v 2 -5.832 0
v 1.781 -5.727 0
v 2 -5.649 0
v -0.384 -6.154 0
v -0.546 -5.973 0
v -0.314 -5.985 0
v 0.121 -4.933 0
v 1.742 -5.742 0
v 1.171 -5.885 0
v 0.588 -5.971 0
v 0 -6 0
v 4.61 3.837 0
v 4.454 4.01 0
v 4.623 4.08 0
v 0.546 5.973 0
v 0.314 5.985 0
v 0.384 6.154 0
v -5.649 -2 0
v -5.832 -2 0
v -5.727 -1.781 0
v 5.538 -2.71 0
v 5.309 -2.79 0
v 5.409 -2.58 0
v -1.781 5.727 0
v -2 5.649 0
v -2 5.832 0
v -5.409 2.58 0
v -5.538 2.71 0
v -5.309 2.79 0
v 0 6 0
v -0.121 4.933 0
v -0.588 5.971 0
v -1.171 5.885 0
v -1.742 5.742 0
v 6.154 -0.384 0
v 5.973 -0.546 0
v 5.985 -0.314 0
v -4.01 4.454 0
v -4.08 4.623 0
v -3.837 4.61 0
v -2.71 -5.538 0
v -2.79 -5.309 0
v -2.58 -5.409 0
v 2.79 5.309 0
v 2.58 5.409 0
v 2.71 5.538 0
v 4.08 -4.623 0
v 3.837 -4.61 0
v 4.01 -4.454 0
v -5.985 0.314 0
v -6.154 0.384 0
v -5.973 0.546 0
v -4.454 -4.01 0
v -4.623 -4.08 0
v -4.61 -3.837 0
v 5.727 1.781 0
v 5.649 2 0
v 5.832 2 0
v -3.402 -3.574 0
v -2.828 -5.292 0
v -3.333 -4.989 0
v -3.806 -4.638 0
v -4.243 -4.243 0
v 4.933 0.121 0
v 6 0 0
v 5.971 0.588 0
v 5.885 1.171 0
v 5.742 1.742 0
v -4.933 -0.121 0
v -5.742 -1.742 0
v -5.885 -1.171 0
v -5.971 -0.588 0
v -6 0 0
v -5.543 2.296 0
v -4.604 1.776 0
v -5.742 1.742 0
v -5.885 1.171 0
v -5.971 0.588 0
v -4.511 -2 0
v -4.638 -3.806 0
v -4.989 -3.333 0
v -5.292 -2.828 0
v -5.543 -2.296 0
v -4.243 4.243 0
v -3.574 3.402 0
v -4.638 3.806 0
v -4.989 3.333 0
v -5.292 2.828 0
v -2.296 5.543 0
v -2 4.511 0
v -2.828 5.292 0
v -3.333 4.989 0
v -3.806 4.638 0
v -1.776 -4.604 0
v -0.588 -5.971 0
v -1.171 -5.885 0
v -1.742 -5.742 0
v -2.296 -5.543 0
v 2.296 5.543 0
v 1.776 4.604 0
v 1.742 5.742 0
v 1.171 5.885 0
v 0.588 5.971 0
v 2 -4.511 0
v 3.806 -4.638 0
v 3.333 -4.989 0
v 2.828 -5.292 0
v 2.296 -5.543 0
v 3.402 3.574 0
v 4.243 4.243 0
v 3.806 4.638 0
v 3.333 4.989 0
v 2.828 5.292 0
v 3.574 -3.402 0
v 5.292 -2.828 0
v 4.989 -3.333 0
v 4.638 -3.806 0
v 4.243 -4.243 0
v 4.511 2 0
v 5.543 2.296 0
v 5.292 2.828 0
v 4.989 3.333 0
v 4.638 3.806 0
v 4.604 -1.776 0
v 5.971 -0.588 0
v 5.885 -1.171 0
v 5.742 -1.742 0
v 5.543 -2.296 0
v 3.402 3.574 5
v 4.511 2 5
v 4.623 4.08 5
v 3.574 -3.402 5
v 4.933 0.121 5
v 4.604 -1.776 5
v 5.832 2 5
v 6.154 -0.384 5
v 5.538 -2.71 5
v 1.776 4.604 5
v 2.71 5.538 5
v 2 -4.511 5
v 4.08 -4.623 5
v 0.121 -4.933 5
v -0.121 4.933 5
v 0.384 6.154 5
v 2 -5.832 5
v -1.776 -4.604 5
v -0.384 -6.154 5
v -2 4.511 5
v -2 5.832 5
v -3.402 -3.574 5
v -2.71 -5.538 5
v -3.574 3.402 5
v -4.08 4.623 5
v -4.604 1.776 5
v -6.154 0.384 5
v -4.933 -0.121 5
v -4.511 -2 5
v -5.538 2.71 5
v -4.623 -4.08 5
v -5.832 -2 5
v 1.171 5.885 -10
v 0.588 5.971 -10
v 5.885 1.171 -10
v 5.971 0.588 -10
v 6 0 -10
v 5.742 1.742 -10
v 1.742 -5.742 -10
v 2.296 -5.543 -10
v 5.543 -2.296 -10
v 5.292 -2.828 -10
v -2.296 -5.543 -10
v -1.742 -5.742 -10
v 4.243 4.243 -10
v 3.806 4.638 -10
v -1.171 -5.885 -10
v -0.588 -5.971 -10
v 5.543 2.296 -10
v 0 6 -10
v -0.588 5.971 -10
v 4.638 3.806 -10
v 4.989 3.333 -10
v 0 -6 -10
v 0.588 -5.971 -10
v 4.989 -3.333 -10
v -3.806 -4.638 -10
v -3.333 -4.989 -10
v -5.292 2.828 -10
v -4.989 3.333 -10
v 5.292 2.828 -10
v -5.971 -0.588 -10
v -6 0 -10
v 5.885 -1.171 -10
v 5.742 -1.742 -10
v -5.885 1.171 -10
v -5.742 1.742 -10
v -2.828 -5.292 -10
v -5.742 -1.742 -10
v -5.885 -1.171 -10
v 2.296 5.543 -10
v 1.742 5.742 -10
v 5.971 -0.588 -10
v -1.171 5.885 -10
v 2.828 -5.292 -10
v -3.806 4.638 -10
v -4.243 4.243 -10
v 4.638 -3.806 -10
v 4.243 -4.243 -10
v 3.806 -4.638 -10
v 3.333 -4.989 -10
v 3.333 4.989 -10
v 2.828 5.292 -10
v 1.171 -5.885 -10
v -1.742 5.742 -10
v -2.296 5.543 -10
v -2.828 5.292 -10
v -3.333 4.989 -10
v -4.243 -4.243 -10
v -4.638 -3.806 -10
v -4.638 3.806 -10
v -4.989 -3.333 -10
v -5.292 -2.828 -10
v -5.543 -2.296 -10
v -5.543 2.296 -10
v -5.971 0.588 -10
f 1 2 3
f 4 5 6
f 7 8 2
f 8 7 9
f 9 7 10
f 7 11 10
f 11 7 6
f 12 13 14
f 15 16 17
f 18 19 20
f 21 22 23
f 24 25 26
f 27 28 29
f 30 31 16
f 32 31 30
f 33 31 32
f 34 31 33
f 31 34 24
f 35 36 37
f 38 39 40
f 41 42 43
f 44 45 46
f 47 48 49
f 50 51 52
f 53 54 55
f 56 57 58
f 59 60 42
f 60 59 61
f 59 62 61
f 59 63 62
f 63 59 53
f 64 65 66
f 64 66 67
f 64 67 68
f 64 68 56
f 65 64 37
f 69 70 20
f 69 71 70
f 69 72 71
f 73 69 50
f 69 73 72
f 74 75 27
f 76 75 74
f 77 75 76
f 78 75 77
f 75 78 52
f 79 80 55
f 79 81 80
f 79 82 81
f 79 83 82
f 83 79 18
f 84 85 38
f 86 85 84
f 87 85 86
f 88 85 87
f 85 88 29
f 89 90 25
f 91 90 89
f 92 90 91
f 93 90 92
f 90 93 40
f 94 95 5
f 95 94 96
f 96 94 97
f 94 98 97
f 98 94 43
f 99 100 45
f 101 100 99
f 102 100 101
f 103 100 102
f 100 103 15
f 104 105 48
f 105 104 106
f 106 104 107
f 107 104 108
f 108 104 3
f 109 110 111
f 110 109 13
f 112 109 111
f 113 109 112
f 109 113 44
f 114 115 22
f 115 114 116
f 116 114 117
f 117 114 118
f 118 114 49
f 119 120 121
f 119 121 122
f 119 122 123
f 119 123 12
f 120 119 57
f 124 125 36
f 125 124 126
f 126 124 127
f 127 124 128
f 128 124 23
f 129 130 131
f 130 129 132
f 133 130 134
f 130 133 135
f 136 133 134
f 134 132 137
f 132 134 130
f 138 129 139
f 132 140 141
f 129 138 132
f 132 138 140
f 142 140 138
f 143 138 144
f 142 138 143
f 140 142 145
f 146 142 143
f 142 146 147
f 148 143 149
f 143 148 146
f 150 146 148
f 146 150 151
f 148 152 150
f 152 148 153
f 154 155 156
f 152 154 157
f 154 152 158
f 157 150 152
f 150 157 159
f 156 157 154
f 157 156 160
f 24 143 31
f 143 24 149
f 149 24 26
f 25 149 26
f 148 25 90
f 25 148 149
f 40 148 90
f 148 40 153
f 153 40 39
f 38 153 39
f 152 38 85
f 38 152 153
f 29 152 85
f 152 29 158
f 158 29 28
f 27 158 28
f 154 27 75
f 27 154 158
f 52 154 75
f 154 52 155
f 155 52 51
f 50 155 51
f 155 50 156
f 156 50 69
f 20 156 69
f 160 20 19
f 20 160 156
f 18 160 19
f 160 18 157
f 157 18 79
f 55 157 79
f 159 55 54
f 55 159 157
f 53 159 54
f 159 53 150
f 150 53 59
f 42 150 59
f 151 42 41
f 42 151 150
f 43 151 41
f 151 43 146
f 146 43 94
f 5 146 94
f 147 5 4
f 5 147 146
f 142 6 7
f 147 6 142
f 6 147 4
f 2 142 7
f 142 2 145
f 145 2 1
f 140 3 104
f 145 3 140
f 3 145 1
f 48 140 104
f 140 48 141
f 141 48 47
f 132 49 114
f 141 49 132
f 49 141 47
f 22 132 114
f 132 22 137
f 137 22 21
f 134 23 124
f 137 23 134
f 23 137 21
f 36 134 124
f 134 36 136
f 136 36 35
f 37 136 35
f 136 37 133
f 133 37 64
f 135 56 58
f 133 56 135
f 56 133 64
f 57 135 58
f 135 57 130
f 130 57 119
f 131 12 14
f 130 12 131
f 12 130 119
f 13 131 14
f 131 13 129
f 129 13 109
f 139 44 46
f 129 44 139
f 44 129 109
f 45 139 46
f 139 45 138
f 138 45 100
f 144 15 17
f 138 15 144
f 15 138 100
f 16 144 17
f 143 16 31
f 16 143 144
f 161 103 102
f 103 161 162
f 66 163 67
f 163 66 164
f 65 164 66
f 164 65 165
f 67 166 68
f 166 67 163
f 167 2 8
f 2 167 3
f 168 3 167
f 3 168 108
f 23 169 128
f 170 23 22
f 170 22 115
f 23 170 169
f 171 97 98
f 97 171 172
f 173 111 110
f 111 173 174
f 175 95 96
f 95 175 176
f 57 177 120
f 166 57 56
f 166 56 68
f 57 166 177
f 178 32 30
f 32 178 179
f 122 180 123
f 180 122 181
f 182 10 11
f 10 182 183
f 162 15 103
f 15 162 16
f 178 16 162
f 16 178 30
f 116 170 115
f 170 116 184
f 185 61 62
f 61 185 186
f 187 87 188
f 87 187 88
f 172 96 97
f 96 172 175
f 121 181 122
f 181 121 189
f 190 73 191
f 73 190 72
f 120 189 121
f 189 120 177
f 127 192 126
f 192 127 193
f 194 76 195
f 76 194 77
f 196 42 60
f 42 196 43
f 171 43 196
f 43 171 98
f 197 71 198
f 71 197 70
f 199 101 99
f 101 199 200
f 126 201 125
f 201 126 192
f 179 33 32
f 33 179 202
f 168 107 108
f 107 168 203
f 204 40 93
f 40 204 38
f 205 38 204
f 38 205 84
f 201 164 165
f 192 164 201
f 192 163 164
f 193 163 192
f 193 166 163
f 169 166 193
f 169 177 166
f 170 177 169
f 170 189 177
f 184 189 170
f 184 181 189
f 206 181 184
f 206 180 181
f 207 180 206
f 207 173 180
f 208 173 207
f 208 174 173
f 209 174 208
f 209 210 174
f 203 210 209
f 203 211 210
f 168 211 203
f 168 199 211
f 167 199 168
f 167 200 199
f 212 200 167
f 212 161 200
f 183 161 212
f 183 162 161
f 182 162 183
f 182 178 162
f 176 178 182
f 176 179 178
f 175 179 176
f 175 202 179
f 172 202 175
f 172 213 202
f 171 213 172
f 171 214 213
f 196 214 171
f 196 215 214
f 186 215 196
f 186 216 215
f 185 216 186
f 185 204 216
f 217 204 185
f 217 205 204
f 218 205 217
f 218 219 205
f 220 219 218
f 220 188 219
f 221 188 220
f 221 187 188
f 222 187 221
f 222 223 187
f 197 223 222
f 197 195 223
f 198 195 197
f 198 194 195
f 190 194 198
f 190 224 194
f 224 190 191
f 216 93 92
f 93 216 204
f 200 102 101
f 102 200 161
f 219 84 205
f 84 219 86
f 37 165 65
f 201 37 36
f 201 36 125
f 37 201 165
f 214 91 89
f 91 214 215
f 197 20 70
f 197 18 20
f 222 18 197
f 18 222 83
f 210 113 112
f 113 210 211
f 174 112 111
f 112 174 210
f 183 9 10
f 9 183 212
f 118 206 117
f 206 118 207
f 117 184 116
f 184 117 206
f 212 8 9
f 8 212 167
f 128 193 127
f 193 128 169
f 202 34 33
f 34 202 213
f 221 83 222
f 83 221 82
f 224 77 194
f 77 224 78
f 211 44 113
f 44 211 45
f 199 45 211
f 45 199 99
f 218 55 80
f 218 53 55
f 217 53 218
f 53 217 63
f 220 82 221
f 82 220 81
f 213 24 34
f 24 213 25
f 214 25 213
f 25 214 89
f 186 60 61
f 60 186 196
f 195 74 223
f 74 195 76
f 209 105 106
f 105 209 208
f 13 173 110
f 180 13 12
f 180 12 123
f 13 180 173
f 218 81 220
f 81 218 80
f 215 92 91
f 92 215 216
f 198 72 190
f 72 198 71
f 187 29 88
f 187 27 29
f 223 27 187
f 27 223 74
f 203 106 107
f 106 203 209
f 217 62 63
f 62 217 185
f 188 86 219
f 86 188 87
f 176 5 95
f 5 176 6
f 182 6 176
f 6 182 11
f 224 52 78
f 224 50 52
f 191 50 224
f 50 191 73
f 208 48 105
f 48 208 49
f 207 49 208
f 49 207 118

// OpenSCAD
module timing_pulley(teeth=16, pitch_diameter=9.75, belt_width=5, hub_diameter=12, hub_height=10) {
    tooth_height = 2;
    tooth_width = pitch_diameter * PI / teeth;
    pulley_height = belt_width + hub_height;
    
    module tooth() {
        translate([0, pitch_diameter / 2, 0])
        rotate([0, 0, 90])
        linear_extrude(height=belt_width)
        polygon(points=[[0, 0], [tooth_width / 2, tooth_height], [-tooth_width / 2, tooth_height]]);
    }
    
    union() {
        // Create the main pulley body
        cylinder(d=pitch_diameter, h=belt_width, $fn=64);
        
        // Add teeth around the pulley
        for (i = [0:teeth-1]) {
            rotate([0, 0, i * 360 / teeth])
            tooth();
        }
        
        // Add the hub
        translate([0, 0, -hub_height])
        cylinder(d=hub_diameter, h=hub_height, $fn=64);
    }
}

timing_pulley();
